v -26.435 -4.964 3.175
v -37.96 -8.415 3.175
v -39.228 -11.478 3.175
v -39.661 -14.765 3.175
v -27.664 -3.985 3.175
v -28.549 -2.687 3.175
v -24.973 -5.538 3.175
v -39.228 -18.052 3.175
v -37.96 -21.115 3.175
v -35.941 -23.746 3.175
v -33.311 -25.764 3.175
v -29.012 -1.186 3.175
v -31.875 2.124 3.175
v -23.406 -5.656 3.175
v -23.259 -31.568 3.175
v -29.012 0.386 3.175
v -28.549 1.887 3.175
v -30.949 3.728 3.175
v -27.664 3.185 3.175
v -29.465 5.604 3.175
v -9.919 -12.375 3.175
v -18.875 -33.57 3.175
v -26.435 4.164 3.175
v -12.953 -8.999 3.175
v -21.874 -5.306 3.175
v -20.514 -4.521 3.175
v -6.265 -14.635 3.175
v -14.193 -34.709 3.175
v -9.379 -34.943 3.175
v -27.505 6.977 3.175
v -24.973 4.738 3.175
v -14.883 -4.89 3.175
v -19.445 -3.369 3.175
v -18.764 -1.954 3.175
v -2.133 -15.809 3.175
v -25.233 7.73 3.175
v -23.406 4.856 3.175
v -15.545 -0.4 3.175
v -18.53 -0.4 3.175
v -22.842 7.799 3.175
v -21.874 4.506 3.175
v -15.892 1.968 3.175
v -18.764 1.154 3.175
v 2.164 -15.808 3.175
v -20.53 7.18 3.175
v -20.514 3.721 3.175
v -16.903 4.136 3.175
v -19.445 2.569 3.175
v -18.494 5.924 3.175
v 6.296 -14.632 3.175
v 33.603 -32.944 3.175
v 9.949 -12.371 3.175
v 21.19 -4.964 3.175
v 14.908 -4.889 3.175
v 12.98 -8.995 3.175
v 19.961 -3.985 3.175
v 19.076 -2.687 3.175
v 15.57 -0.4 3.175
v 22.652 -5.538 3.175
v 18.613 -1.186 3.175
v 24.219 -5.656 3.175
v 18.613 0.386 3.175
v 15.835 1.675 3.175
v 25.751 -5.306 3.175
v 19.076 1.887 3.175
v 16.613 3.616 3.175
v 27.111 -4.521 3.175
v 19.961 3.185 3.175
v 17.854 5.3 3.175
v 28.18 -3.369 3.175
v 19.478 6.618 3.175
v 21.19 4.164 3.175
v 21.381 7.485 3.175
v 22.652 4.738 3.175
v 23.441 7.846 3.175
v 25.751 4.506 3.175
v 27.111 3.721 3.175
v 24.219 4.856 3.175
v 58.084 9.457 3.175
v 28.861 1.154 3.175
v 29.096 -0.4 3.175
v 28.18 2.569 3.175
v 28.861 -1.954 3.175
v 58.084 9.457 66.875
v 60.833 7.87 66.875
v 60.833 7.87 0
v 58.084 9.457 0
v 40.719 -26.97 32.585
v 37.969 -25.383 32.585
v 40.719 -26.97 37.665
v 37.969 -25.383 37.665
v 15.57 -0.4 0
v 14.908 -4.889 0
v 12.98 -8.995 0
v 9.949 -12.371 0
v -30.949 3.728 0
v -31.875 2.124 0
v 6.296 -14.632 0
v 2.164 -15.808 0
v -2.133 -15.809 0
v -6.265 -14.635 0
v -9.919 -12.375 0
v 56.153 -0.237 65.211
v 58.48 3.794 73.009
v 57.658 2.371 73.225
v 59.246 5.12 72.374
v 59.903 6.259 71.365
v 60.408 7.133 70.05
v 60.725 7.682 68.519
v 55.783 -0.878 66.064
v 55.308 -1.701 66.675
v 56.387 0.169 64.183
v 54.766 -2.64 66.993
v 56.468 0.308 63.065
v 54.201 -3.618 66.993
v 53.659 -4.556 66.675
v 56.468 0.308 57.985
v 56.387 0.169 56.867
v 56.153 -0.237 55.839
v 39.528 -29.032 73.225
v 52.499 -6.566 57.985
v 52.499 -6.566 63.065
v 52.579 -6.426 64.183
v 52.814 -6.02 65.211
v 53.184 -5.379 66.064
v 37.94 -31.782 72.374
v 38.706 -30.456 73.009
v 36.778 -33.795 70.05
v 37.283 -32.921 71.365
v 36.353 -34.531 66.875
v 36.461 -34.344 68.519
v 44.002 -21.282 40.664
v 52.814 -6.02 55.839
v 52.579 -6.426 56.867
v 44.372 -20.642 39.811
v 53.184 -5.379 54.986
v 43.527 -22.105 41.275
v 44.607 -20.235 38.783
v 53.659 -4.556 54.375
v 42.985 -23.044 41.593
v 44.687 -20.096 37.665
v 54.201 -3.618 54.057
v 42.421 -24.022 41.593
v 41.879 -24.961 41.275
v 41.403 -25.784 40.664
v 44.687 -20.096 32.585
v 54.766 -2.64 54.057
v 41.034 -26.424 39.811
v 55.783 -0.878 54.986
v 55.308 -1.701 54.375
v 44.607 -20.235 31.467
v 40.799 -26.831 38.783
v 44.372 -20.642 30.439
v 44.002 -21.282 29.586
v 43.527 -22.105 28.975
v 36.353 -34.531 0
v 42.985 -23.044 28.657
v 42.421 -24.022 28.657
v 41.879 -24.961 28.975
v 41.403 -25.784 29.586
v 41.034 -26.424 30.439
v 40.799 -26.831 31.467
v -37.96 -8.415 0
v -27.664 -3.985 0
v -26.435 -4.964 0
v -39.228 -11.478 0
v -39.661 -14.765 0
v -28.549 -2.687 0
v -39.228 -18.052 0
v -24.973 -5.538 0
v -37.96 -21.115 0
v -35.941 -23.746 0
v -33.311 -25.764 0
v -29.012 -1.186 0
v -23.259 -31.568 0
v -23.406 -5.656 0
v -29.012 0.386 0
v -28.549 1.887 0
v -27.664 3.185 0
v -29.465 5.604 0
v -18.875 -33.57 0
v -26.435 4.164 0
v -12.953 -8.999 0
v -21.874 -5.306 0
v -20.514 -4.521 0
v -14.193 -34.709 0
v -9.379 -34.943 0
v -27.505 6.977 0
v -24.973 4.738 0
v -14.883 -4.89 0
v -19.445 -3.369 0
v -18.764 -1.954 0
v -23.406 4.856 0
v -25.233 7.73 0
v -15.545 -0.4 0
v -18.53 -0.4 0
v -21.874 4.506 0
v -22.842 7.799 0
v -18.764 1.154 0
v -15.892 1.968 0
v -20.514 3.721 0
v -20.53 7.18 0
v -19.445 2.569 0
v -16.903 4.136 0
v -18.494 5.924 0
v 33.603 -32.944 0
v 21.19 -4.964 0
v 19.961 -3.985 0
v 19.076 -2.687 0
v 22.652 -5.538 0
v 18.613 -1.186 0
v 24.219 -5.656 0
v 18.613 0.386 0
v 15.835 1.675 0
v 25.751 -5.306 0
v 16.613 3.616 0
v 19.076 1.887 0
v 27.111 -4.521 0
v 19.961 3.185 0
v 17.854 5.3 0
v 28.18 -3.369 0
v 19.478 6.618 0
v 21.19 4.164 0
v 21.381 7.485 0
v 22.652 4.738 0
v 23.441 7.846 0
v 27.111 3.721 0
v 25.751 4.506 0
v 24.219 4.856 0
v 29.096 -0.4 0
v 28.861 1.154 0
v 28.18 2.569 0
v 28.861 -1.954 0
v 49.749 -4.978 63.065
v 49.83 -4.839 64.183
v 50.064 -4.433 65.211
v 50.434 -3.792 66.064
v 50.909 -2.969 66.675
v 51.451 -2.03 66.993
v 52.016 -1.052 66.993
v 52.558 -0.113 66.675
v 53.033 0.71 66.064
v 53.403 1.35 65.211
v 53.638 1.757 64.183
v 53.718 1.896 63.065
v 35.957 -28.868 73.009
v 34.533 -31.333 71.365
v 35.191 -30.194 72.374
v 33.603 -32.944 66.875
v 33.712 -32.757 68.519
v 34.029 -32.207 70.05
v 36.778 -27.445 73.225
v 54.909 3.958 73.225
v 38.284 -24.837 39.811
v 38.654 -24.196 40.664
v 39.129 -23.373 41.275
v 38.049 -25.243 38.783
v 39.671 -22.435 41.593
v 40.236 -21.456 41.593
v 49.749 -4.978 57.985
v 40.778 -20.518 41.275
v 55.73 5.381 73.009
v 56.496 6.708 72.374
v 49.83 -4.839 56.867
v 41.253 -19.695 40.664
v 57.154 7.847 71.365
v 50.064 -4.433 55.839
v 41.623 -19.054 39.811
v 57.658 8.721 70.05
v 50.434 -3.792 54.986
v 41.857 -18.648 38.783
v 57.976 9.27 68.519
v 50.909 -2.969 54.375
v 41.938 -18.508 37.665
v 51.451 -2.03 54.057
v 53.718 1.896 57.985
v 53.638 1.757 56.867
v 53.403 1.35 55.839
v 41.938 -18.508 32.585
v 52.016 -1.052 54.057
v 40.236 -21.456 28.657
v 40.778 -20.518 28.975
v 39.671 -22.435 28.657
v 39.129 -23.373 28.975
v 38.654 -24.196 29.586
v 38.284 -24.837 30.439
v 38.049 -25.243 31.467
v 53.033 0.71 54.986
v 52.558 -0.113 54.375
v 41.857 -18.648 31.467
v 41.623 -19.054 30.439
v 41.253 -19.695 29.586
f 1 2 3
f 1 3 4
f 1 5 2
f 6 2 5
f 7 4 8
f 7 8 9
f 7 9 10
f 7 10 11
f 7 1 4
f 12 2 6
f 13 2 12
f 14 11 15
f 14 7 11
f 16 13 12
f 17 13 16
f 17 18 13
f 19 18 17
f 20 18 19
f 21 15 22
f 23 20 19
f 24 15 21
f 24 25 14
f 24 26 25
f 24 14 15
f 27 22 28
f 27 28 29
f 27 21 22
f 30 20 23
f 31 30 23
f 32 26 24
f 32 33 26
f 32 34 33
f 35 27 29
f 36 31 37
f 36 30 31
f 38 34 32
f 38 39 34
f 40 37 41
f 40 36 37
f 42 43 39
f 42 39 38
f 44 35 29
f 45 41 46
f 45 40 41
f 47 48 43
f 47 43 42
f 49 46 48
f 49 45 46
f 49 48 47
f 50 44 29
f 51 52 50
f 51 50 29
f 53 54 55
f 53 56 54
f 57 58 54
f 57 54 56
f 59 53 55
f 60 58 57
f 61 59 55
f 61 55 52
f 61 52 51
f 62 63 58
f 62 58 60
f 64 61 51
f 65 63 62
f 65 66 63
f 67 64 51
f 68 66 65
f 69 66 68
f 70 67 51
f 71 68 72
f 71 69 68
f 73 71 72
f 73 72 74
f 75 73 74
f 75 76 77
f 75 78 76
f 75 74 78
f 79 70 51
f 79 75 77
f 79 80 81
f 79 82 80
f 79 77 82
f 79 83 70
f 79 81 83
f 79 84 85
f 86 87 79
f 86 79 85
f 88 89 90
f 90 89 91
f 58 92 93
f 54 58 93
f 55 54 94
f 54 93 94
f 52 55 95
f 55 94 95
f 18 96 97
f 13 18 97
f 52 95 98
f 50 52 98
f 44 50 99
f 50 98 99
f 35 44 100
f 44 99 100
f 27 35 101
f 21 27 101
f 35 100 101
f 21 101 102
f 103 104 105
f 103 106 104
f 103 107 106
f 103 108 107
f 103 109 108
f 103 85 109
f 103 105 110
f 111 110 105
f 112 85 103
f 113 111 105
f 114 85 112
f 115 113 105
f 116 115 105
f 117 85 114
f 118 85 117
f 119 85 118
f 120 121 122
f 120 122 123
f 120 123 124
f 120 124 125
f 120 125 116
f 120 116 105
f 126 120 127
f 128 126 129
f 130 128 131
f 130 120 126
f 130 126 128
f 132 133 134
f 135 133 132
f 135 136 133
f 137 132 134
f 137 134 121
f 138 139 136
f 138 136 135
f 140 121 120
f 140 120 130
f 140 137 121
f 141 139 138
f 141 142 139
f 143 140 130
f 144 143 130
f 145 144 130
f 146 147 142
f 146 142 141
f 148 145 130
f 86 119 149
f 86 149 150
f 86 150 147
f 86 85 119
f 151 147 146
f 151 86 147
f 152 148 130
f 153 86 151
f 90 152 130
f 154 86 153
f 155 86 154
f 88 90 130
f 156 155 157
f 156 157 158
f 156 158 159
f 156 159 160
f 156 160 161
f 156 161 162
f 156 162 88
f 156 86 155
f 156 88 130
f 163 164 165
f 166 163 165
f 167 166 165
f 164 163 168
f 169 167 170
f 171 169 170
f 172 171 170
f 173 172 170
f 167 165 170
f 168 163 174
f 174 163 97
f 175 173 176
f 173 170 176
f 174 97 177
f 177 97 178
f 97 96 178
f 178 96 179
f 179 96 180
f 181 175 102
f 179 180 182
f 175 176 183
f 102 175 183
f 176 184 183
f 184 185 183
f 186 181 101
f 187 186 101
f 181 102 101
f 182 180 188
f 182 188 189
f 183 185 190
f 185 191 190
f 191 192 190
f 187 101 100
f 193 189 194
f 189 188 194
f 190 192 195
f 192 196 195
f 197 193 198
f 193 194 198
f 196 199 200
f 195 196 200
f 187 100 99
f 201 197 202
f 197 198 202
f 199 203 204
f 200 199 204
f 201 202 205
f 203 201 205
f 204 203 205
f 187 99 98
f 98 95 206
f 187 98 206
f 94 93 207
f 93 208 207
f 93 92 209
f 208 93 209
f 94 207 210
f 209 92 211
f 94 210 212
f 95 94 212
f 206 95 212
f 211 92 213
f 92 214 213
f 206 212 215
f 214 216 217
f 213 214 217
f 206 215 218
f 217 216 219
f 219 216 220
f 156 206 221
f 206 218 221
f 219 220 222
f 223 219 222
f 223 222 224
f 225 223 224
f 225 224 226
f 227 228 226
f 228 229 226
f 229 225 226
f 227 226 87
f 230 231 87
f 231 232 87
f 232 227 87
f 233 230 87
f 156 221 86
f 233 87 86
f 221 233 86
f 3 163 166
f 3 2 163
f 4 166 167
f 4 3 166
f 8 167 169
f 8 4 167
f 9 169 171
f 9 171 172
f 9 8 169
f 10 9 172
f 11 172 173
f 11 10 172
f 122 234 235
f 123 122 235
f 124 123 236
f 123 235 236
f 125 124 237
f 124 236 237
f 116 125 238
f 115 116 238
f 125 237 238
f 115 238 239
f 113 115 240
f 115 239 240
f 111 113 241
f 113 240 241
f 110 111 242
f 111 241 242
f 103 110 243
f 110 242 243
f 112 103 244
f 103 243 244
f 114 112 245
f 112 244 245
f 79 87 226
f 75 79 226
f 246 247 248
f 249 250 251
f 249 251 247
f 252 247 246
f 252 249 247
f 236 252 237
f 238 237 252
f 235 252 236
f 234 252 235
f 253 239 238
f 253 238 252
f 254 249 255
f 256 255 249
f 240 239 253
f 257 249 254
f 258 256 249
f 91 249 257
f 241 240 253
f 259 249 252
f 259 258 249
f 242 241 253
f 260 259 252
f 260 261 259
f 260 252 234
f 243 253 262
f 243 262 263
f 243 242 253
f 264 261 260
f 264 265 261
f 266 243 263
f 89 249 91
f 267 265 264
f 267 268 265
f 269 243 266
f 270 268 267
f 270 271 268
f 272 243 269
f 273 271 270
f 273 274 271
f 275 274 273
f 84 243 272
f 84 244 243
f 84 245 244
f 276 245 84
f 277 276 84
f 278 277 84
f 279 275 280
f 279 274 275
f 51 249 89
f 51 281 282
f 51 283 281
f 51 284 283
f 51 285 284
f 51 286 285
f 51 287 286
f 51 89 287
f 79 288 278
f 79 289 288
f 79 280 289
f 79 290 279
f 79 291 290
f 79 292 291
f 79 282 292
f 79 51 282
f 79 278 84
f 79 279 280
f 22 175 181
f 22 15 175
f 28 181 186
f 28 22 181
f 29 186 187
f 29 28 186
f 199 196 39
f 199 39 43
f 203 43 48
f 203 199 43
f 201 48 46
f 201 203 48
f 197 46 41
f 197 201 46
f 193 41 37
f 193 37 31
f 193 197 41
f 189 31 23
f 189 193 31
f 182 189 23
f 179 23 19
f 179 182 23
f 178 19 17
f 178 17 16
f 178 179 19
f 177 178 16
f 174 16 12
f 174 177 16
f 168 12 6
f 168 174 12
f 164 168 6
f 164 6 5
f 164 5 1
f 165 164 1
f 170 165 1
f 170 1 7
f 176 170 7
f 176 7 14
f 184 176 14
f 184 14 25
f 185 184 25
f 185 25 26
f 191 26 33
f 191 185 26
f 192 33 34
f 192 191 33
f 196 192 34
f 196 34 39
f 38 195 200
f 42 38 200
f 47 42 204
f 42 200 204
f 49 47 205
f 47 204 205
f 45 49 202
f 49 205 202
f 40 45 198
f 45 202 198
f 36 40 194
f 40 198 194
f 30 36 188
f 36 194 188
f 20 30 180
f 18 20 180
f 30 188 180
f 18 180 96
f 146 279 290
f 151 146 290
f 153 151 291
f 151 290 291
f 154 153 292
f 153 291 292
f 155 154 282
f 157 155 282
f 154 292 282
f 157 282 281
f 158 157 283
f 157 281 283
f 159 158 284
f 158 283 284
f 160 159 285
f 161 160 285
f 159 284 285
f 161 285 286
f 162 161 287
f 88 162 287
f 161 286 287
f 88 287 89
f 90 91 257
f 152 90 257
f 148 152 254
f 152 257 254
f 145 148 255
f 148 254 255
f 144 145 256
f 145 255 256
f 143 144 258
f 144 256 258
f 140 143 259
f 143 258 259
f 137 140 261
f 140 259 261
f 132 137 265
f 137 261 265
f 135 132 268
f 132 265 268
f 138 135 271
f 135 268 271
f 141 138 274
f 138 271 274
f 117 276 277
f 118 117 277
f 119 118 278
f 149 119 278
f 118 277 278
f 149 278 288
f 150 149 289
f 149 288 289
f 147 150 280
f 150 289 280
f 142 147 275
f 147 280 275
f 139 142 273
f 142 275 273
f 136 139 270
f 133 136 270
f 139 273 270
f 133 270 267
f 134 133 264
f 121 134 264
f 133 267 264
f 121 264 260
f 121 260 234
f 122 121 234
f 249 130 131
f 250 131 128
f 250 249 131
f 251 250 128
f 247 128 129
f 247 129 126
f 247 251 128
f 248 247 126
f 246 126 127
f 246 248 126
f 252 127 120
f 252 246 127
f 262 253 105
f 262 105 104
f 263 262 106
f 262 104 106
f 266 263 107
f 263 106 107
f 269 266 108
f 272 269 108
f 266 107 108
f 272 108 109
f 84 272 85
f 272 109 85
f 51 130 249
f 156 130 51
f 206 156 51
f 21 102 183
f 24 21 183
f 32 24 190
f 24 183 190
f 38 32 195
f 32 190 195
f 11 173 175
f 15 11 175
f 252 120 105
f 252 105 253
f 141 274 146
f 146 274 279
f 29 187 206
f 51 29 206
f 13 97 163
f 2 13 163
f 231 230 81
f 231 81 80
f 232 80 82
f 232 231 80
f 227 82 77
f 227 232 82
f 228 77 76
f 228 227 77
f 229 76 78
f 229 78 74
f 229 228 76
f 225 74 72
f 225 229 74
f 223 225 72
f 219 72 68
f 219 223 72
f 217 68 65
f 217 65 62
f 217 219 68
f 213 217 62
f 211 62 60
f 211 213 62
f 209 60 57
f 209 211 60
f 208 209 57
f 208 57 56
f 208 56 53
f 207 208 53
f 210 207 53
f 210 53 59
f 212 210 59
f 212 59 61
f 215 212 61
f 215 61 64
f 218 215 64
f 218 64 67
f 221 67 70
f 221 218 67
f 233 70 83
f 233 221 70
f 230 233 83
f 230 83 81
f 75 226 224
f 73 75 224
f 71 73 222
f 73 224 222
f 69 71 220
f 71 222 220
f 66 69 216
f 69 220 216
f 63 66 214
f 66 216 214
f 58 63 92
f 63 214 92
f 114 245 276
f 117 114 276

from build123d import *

# Parameters (mm, degrees)
SKETCH3_R           = 5.2705
BOSS_EXTRUDE1_DEPTH = 3.175
BOSS_EXTRUDE2_DEPTH = 70.05
FILLET1_R           = 12.7
FILLET3_R           = 25.4
SKETCH5_R           = 3.96875
CUT_EXTRUDE1_DEPTH  = 6.35
FILLET4_R           = 6.35


with BuildPart() as part:
    # Sketch3 → Boss-Extrude1 (new body)
    with BuildSketch(Plane.XY):
        with BuildLine():
            Line((-31.875, 1.314467847), (-31.875, 2.123689729))
            Line((-31.875, 2.123689729), (-44.309751158, -19.413931056))
            Line((-44.309751158, -19.413931056), (-16.813444588, -35.288931056))
            Line((-16.813444588, -35.288931056), (33.603324087, -32.943986013))
            Line((33.603324087, -32.943986013), (36.352954744, -34.531486013))
            Line((36.352954744, -34.531486013), (60.833371586, 7.869839748))
            Line((60.833371586, 7.869839748), (58.083740929, 9.457339748))
            Line((58.083740929, 9.457339748), (23.441464566, 7.84608547))
            ThreePointArc((23.441464566, 7.84608547), (28.824079828, 6.169187612), (31.875, 1.428257367))
            ThreePointArc((31.875, 1.428257367), (32.028589915, 0.519857326), (32.08, -0.4))
            ThreePointArc((32.08, -0.4), (32.028589915, -1.319857326), (31.875, -2.228257367))
            Line((31.875, -2.228257367), (31.875, -6.284053394))
            ThreePointArc((31.875, -6.284053394), (21.132205448, -10.12115273), (9.948783703, -12.371051434))
            ThreePointArc((9.948783703, -12.371051434), (0.015428746, -15.957499724), (-9.919275826, -12.374791656))
            ThreePointArc((-9.919275826, -12.374791656), (-21.117875037, -10.125129582), (-31.875, -6.284053394))
            Line((-31.875, -6.284053394), (-31.875, -2.114467847))
            ThreePointArc((-31.875, -2.114467847), (-32.055, -0.4), (-31.875, 1.314467847))
        make_face()
        with BuildLine():
            ThreePointArc((15.57, -0.4), (14.094750174, -7.012566542), (9.948783703, -12.371051434))
            ThreePointArc((9.948783703, -12.371051434), (21.132205448, -10.12115273), (31.875, -6.284053394))
            Line((31.875, -6.284053394), (31.875, -2.228257367))
            ThreePointArc((31.875, -2.228257367), (22.905142674, -8.603589915), (15.57, -0.4))
        make_face()
        with BuildLine():
            ThreePointArc((23.441464566, 7.84608547), (17.853772739, 5.299953508), (15.57, -0.4))
            ThreePointArc((15.57, -0.4), (22.905142674, -8.603589915), (31.875, -2.228257367))
            Line((31.875, -2.228257367), (31.875, 1.428257367))
            ThreePointArc((31.875, 1.428257367), (28.824079828, 6.169187612), (23.441464566, 7.84608547))
        make_face()
        with Locations((23.825, -0.4)):
            Circle(SKETCH3_R, mode=Mode.SUBTRACT)
        with BuildLine():
            ThreePointArc((-9.919275826, -12.374791656), (-14.068505089, -7.015217451), (-15.545, -0.4))
            ThreePointArc((-15.545, -0.4), (-22.938054526, -8.609876674), (-31.875, -2.114467847))
            Line((-31.875, -2.114467847), (-31.875, -6.284053394))
            ThreePointArc((-31.875, -6.284053394), (-21.117875037, -10.125129582), (-9.919275826, -12.374791656))
        make_face()
        with BuildLine():
            ThreePointArc((-15.545, -0.4), (-21.663448783, 7.573717696), (-30.949039708, 3.7275))
            ThreePointArc((-30.949039708, 3.7275), (-31.507044005, 2.557447835), (-31.875, 1.314467847))
            Line((-31.875, 1.314467847), (-31.875, -2.114467847))
            ThreePointArc((-31.875, -2.114467847), (-22.938054526, -8.609876674), (-15.545, -0.4))
        make_face()
        with Locations((-23.8, -0.4)):
            Circle(SKETCH3_R, mode=Mode.SUBTRACT)
        with BuildLine():
            Line((31.875, 1.428257367), (31.875, -2.228257367))
            ThreePointArc((31.875, -2.228257367), (32.028589915, -1.319857326), (32.08, -0.4))
            ThreePointArc((32.08, -0.4), (32.028589915, 0.519857326), (31.875, 1.428257367))
        make_face()
        with BuildLine():
            Line((-31.875, -2.114467847), (-31.875, 1.314467847))
            ThreePointArc((-31.875, 1.314467847), (-32.055, -0.4), (-31.875, -2.114467847))
        make_face()
        with BuildLine():
            ThreePointArc((-31.875, 1.314467847), (-31.507044005, 2.557447835), (-30.949039708, 3.7275))
            Line((-30.949039708, 3.7275), (-31.875, 2.123689729))
            Line((-31.875, 2.123689729), (-31.875, 1.314467847))
        make_face()
    extrude(amount=BOSS_EXTRUDE1_DEPTH)

    # Sketch4 → Boss-Extrude2 (add)
    with BuildSketch(Plane.XY.offset(3.175)):
        Polygon((60.833371586, 7.869839748), (36.352954744, -34.531486013), (33.603324087, -32.943986013), (58.083740929, 9.457339748), align=None)
    extrude(amount=BOSS_EXTRUDE2_DEPTH)

    # Fillet1
    fillet1_edges = [part.edges().sort_by_distance(p)[0] for p in [
        (-44.309751158, -19.413931056, 1.5875),
    ]]
    fillet(fillet1_edges, radius=FILLET1_R)

    # Fillet3
    fillet3_edges = [part.edges().sort_by_distance(p)[0] for p in [
        (-16.813444588, -35.288931056, 1.5875),
    ]]
    fillet(fillet3_edges, radius=FILLET3_R)

    # Sketch5 → Cut-Extrude1 (cut)
    with BuildSketch(Plane(origin=(39.46765746, -22.786662659, 0), x_dir=(0, 0, 1), z_dir=(-0.866025404, 0.5, 0))):
        with Locations((63.065, 24.532166939)):
            Circle(SKETCH5_R)
        with Locations((57.985, 24.532166939)):
            Circle(SKETCH5_R)
        with BuildLine():
            ThreePointArc((60.525, 21.482679021), (59.335614932, 20.800302007), (57.985, 20.563416939))
            Line((57.985, 20.563416939), (63.065, 20.563416939))
            ThreePointArc((63.065, 20.563416939), (61.714385068, 20.800302007), (60.525, 21.482679021))
        make_face()
        with BuildLine():
            Line((63.065, 28.500916939), (57.985, 28.500916939))
            ThreePointArc((57.985, 28.500916939), (59.335614932, 28.26403187), (60.525, 27.581654857))
            ThreePointArc((60.525, 27.581654857), (61.714385068, 28.26403187), (63.065, 28.500916939))
        make_face()
        with Locations((37.665, 0.971333254)):
            Circle(SKETCH5_R)
        with Locations((32.585, 0.971333254)):
            Circle(SKETCH5_R)
        with BuildLine():
            Line((37.665, 4.940083254), (32.585, 4.940083254))
            ThreePointArc((32.585, 4.940083254), (33.935614932, 4.703198186), (35.125, 4.020821172))
            ThreePointArc((35.125, 4.020821172), (36.314385068, 4.703198186), (37.665, 4.940083254))
        make_face()
        with BuildLine():
            ThreePointArc((35.125, -2.078154664), (33.935614932, -2.760531678), (32.585, -2.997416746))
            Line((32.585, -2.997416746), (37.665, -2.997416746))
            ThreePointArc((37.665, -2.997416746), (36.314385068, -2.760531678), (35.125, -2.078154664))
        make_face()
    extrude(amount=-CUT_EXTRUDE1_DEPTH, mode=Mode.SUBTRACT)

    # Fillet4
    fillet4_edges = [part.edges().sort_by_distance(p)[0] for p in [
        (34.978139415, -33.737736013, 73.225),
        (59.458556258, 8.663589748, 73.225),
    ]]
    fillet(fillet4_edges, radius=FILLET4_R)


solid = part.part
